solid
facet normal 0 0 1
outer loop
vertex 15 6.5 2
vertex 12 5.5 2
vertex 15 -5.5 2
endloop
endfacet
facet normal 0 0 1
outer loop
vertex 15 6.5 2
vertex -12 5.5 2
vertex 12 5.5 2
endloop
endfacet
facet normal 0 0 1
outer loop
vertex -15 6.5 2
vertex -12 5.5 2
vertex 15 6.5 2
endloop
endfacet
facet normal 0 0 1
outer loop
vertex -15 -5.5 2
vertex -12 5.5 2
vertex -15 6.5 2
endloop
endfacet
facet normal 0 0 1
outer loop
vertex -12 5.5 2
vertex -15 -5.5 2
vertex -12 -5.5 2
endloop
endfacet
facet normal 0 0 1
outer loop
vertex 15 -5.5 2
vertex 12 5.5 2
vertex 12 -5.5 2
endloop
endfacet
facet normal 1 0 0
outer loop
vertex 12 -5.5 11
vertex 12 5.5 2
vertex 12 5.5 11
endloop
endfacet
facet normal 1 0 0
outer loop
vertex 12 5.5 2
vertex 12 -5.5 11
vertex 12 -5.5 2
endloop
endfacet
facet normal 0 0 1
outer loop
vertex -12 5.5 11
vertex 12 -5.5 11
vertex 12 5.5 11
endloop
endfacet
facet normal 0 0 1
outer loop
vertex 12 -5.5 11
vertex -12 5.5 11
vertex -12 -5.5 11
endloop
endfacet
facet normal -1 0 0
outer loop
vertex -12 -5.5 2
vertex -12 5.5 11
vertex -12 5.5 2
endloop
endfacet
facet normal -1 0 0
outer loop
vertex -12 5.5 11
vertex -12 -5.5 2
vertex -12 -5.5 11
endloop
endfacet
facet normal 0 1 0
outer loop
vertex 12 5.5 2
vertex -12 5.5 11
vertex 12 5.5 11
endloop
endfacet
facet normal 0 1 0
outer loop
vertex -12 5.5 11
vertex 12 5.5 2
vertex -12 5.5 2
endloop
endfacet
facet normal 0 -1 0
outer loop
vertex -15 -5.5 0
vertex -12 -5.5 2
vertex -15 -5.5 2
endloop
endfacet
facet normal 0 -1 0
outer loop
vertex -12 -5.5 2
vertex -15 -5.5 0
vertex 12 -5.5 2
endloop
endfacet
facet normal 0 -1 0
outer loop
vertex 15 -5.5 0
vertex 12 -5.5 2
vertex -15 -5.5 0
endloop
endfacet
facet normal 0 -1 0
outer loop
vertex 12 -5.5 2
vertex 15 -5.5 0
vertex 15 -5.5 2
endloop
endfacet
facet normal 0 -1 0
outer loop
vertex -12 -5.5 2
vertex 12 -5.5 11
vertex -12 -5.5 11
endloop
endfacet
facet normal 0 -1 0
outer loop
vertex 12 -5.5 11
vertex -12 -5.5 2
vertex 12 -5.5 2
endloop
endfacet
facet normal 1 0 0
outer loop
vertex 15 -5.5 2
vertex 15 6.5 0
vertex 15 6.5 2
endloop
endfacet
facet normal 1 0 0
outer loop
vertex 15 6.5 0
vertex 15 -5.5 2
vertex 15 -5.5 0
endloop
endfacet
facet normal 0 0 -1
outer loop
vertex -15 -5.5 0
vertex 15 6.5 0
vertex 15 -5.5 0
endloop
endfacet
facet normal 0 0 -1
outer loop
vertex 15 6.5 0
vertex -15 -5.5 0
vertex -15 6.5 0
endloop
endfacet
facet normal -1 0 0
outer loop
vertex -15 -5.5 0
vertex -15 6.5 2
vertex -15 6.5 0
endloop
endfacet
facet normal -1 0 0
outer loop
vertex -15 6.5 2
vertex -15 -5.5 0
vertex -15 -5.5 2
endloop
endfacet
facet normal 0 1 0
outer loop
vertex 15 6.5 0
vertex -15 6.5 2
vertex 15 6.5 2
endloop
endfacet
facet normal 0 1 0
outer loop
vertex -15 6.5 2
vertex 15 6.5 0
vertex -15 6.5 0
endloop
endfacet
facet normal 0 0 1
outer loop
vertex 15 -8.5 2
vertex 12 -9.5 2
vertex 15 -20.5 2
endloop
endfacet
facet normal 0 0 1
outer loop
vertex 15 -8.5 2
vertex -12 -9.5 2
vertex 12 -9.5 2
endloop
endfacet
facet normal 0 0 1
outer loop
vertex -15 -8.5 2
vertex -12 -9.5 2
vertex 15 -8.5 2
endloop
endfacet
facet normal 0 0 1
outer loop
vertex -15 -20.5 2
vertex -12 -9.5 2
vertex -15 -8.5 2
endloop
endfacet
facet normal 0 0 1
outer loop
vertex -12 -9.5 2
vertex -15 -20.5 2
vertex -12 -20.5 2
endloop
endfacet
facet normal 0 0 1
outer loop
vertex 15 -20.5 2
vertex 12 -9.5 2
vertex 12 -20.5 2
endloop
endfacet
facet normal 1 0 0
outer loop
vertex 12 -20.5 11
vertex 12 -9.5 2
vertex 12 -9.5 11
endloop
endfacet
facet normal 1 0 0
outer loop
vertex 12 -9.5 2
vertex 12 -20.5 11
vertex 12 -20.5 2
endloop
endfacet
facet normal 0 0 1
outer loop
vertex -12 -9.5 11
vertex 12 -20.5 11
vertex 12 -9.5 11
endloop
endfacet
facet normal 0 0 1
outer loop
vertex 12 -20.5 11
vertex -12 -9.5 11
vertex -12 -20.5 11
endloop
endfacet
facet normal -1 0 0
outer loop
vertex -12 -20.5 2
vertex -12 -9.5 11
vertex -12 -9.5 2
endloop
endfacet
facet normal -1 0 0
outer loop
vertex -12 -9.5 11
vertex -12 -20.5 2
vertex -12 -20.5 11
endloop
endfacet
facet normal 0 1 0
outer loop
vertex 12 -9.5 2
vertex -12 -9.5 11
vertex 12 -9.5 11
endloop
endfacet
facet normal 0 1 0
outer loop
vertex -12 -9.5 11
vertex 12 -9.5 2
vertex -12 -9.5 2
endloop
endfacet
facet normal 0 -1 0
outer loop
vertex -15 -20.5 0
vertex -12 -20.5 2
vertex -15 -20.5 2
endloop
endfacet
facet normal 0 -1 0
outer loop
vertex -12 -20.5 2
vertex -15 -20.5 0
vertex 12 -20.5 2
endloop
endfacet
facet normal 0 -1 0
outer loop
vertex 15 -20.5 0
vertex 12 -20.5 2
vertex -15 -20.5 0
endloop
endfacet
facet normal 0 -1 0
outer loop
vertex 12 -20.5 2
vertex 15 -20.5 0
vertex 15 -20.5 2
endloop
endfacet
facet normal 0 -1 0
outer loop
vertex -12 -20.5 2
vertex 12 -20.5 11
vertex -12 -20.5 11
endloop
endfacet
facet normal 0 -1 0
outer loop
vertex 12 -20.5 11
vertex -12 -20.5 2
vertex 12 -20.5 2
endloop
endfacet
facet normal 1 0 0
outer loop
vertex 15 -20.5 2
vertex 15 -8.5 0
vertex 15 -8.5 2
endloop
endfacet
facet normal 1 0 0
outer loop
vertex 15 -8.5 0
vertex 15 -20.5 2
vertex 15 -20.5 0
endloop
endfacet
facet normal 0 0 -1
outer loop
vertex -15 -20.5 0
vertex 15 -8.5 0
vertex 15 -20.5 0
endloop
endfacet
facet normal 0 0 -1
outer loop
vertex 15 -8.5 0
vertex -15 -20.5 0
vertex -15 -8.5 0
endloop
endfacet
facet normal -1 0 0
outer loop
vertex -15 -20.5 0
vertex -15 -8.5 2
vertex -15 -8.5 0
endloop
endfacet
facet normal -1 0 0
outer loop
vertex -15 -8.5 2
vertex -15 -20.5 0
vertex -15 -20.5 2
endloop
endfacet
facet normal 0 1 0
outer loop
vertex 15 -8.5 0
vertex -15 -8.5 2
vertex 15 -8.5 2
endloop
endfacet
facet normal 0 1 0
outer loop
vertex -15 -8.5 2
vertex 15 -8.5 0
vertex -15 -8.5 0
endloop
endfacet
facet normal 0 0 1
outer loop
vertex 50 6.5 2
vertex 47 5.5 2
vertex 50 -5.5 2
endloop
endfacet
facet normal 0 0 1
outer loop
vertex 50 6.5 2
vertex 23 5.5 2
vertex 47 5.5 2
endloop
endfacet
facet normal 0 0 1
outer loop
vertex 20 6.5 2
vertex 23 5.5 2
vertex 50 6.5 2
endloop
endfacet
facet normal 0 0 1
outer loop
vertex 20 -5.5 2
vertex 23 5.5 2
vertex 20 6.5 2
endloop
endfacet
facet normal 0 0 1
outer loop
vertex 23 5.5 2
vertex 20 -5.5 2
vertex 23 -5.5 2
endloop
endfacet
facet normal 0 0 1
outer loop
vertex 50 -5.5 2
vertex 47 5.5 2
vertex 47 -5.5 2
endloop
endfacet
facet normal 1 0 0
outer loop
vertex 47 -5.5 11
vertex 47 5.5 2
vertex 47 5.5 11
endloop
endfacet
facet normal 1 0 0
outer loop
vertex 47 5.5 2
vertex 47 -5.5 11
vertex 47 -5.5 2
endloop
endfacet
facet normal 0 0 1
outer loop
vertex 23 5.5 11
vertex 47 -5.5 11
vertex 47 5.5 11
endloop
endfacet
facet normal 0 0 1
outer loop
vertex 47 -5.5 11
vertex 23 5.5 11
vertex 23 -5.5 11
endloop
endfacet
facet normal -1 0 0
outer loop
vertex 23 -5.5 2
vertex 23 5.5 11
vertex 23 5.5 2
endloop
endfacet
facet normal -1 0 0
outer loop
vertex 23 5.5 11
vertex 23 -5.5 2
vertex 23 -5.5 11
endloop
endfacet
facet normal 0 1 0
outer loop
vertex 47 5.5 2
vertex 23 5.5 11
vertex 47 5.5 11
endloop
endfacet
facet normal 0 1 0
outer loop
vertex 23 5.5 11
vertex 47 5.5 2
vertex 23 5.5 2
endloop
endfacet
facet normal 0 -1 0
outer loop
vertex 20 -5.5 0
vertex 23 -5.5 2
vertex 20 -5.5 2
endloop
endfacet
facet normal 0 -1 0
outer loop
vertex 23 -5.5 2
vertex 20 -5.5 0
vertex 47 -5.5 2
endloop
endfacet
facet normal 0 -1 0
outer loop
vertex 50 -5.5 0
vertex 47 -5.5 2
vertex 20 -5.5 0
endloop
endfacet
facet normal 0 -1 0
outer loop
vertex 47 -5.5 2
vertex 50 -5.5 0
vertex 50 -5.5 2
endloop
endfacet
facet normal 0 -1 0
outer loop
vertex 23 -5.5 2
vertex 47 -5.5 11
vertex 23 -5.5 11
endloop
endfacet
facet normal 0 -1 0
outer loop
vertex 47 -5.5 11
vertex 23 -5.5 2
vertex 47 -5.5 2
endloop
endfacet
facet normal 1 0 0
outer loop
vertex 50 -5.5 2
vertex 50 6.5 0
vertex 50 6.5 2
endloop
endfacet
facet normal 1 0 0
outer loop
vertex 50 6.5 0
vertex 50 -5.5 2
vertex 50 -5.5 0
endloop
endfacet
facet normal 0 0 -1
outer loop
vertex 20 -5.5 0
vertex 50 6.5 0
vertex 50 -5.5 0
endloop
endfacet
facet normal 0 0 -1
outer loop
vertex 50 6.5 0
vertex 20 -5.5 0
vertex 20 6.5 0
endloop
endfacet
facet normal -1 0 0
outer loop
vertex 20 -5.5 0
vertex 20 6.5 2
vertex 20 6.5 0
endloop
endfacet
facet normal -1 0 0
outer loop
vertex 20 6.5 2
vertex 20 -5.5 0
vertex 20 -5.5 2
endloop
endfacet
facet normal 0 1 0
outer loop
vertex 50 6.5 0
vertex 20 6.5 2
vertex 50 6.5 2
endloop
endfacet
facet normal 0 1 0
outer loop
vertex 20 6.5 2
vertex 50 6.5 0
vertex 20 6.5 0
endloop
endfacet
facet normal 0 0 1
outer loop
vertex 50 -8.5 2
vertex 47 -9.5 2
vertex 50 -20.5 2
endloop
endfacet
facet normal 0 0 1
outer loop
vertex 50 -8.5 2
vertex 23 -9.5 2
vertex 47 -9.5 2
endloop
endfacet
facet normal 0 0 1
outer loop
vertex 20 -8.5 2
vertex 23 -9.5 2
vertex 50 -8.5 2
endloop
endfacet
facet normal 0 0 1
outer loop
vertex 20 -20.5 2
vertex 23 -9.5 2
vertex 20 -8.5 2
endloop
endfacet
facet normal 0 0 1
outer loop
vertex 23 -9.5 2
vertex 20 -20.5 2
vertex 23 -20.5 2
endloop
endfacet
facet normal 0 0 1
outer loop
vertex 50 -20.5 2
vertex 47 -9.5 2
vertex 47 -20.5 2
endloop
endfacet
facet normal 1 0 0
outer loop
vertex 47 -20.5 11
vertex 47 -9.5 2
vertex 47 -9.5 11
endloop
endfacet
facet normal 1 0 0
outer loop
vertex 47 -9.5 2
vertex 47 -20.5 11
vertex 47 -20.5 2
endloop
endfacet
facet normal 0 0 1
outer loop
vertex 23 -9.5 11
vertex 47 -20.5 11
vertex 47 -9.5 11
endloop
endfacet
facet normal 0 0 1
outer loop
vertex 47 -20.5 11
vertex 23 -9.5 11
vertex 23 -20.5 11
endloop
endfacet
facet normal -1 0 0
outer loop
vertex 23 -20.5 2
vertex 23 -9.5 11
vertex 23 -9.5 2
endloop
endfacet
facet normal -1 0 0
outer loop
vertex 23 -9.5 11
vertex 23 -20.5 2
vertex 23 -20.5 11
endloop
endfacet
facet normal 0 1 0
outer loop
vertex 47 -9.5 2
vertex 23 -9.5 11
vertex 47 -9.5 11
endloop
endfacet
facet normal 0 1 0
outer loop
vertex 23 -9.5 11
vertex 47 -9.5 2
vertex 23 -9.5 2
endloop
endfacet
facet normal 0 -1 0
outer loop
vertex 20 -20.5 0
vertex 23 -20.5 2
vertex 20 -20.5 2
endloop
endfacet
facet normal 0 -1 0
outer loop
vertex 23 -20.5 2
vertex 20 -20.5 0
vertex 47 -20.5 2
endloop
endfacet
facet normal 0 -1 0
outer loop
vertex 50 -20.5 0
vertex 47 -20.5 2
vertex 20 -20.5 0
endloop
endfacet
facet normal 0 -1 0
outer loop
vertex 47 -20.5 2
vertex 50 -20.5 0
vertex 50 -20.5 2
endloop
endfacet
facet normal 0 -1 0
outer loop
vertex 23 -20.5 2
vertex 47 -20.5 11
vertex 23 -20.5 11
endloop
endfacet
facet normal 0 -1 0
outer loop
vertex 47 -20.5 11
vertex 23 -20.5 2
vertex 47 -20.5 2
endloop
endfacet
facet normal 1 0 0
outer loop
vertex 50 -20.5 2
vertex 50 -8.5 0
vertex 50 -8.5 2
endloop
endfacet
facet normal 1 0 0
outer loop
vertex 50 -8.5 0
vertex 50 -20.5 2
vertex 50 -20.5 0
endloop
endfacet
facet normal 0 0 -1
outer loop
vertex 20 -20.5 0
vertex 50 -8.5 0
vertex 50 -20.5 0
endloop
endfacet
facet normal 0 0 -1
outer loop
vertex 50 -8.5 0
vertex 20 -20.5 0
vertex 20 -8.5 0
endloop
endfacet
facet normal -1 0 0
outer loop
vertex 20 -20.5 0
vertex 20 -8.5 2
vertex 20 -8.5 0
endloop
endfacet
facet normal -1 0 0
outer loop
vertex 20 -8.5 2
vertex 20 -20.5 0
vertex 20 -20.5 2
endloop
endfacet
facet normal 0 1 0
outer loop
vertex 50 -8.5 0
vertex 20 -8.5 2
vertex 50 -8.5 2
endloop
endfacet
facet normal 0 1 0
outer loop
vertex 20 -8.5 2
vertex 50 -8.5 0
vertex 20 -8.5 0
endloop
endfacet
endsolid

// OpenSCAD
// file: display.scad
/**
 * Available displays:
 * 
 * Seed Technology:
 * + http://media.digikey.com/pdf/Data%20Sheets/Seeed%20Technology/114990163_Web.pdf
 */

//display("seedVoltMeterGreen");
//display("seedVoltMeterYellow");
//display("seedVoltMeterRed");

module display(type, displayColor="white", holes=true) {
  if(type == "seedVoltMeterGreen")
    seedVoltMeter(displayColor, "green", holes);

  if(type == "seedVoltMeterYellow")
    seedVoltMeter(displayColor, "yellow", holes);

  if(type == "seedVoltMeterRed")
    seedVoltMeter(displayColor, "red", holes);

  if(type == "seedVoltMeterBlue")
    seedVoltMeter(displayColor, "blue", holes);
}

module seedVoltMeter(displayColor="white", ledColor="green", holes=true) {
  displayLength = 24;
  displayWidth = 11;
  displayHeight = (holes) ? 9 : 10;

  boardLength = 30;
  boardWidth = 12;
  boardHeight = 2;

  padding = (boardLength - displayLength) / 2;

  segmentLength = 8;
  paddingSegment = 2.2;
  segmentWidth = (displayLength - paddingSegment * 4) / 3;

  segments = [
    [padding + 1.5, 1.5, boardHeight],
    [padding + segmentWidth + paddingSegment * 2, 1.5, boardHeight],
    [padding + (segmentWidth + paddingSegment) * 2 + paddingSegment, 1.5, boardHeight]
  ];

  translate([-boardLength / 2, -displayWidth / 2, 0]) {
    color(displayColor)
      group() {
        cube([boardLength, boardWidth, boardHeight]);

        difference() {
          translate([padding, 0, boardHeight])
            cube([displayLength, displayWidth, displayHeight]);

          if(holes)
            for(pos=segments)
              translate(pos)
                segment(displayHeight + 1);
        }
      }

      if(holes)
        for(pos=segments)
          translate(pos)
            color(ledColor)
              segment(displayHeight);
  }

  module segment(height, color="white") {
    length = segmentWidth - 2;
    width = 0.5;
    horizontal = [
      [1, 0, 0],
      [1, (segmentLength - width) / 2, 0],
      [1, segmentLength - width, 0]
    ];

    vertical = [
      [0, width, 0],
      [segmentWidth - width, width, 0],
      [0, width + (segmentLength - width * 3) / 2 +width, 0],
      [segmentWidth - width, width + (segmentLength - width * 3) / 2 +width, 0]
    ];

    group() {
      for(pos=horizontal)
        translate(pos)
          cube([length, width, height]);

      for(pos=vertical)
        translate(pos)
          cube([width, (segmentLength - width * 3) / 2, height]);

      translate([segmentWidth + width * 1.5, 0, 0])
        cube([width, width, height]);
    }
  }
}
// main file
include <display.scad>;

display("seedVoltMeterGreen");

translate([0, -15, 0])
  display("seedVoltMeterYellow");

translate([35, 0, 0])
  display("seedVoltMeterRed");

translate([35, -15, 0])
  display("seedVoltMeterBlue");
